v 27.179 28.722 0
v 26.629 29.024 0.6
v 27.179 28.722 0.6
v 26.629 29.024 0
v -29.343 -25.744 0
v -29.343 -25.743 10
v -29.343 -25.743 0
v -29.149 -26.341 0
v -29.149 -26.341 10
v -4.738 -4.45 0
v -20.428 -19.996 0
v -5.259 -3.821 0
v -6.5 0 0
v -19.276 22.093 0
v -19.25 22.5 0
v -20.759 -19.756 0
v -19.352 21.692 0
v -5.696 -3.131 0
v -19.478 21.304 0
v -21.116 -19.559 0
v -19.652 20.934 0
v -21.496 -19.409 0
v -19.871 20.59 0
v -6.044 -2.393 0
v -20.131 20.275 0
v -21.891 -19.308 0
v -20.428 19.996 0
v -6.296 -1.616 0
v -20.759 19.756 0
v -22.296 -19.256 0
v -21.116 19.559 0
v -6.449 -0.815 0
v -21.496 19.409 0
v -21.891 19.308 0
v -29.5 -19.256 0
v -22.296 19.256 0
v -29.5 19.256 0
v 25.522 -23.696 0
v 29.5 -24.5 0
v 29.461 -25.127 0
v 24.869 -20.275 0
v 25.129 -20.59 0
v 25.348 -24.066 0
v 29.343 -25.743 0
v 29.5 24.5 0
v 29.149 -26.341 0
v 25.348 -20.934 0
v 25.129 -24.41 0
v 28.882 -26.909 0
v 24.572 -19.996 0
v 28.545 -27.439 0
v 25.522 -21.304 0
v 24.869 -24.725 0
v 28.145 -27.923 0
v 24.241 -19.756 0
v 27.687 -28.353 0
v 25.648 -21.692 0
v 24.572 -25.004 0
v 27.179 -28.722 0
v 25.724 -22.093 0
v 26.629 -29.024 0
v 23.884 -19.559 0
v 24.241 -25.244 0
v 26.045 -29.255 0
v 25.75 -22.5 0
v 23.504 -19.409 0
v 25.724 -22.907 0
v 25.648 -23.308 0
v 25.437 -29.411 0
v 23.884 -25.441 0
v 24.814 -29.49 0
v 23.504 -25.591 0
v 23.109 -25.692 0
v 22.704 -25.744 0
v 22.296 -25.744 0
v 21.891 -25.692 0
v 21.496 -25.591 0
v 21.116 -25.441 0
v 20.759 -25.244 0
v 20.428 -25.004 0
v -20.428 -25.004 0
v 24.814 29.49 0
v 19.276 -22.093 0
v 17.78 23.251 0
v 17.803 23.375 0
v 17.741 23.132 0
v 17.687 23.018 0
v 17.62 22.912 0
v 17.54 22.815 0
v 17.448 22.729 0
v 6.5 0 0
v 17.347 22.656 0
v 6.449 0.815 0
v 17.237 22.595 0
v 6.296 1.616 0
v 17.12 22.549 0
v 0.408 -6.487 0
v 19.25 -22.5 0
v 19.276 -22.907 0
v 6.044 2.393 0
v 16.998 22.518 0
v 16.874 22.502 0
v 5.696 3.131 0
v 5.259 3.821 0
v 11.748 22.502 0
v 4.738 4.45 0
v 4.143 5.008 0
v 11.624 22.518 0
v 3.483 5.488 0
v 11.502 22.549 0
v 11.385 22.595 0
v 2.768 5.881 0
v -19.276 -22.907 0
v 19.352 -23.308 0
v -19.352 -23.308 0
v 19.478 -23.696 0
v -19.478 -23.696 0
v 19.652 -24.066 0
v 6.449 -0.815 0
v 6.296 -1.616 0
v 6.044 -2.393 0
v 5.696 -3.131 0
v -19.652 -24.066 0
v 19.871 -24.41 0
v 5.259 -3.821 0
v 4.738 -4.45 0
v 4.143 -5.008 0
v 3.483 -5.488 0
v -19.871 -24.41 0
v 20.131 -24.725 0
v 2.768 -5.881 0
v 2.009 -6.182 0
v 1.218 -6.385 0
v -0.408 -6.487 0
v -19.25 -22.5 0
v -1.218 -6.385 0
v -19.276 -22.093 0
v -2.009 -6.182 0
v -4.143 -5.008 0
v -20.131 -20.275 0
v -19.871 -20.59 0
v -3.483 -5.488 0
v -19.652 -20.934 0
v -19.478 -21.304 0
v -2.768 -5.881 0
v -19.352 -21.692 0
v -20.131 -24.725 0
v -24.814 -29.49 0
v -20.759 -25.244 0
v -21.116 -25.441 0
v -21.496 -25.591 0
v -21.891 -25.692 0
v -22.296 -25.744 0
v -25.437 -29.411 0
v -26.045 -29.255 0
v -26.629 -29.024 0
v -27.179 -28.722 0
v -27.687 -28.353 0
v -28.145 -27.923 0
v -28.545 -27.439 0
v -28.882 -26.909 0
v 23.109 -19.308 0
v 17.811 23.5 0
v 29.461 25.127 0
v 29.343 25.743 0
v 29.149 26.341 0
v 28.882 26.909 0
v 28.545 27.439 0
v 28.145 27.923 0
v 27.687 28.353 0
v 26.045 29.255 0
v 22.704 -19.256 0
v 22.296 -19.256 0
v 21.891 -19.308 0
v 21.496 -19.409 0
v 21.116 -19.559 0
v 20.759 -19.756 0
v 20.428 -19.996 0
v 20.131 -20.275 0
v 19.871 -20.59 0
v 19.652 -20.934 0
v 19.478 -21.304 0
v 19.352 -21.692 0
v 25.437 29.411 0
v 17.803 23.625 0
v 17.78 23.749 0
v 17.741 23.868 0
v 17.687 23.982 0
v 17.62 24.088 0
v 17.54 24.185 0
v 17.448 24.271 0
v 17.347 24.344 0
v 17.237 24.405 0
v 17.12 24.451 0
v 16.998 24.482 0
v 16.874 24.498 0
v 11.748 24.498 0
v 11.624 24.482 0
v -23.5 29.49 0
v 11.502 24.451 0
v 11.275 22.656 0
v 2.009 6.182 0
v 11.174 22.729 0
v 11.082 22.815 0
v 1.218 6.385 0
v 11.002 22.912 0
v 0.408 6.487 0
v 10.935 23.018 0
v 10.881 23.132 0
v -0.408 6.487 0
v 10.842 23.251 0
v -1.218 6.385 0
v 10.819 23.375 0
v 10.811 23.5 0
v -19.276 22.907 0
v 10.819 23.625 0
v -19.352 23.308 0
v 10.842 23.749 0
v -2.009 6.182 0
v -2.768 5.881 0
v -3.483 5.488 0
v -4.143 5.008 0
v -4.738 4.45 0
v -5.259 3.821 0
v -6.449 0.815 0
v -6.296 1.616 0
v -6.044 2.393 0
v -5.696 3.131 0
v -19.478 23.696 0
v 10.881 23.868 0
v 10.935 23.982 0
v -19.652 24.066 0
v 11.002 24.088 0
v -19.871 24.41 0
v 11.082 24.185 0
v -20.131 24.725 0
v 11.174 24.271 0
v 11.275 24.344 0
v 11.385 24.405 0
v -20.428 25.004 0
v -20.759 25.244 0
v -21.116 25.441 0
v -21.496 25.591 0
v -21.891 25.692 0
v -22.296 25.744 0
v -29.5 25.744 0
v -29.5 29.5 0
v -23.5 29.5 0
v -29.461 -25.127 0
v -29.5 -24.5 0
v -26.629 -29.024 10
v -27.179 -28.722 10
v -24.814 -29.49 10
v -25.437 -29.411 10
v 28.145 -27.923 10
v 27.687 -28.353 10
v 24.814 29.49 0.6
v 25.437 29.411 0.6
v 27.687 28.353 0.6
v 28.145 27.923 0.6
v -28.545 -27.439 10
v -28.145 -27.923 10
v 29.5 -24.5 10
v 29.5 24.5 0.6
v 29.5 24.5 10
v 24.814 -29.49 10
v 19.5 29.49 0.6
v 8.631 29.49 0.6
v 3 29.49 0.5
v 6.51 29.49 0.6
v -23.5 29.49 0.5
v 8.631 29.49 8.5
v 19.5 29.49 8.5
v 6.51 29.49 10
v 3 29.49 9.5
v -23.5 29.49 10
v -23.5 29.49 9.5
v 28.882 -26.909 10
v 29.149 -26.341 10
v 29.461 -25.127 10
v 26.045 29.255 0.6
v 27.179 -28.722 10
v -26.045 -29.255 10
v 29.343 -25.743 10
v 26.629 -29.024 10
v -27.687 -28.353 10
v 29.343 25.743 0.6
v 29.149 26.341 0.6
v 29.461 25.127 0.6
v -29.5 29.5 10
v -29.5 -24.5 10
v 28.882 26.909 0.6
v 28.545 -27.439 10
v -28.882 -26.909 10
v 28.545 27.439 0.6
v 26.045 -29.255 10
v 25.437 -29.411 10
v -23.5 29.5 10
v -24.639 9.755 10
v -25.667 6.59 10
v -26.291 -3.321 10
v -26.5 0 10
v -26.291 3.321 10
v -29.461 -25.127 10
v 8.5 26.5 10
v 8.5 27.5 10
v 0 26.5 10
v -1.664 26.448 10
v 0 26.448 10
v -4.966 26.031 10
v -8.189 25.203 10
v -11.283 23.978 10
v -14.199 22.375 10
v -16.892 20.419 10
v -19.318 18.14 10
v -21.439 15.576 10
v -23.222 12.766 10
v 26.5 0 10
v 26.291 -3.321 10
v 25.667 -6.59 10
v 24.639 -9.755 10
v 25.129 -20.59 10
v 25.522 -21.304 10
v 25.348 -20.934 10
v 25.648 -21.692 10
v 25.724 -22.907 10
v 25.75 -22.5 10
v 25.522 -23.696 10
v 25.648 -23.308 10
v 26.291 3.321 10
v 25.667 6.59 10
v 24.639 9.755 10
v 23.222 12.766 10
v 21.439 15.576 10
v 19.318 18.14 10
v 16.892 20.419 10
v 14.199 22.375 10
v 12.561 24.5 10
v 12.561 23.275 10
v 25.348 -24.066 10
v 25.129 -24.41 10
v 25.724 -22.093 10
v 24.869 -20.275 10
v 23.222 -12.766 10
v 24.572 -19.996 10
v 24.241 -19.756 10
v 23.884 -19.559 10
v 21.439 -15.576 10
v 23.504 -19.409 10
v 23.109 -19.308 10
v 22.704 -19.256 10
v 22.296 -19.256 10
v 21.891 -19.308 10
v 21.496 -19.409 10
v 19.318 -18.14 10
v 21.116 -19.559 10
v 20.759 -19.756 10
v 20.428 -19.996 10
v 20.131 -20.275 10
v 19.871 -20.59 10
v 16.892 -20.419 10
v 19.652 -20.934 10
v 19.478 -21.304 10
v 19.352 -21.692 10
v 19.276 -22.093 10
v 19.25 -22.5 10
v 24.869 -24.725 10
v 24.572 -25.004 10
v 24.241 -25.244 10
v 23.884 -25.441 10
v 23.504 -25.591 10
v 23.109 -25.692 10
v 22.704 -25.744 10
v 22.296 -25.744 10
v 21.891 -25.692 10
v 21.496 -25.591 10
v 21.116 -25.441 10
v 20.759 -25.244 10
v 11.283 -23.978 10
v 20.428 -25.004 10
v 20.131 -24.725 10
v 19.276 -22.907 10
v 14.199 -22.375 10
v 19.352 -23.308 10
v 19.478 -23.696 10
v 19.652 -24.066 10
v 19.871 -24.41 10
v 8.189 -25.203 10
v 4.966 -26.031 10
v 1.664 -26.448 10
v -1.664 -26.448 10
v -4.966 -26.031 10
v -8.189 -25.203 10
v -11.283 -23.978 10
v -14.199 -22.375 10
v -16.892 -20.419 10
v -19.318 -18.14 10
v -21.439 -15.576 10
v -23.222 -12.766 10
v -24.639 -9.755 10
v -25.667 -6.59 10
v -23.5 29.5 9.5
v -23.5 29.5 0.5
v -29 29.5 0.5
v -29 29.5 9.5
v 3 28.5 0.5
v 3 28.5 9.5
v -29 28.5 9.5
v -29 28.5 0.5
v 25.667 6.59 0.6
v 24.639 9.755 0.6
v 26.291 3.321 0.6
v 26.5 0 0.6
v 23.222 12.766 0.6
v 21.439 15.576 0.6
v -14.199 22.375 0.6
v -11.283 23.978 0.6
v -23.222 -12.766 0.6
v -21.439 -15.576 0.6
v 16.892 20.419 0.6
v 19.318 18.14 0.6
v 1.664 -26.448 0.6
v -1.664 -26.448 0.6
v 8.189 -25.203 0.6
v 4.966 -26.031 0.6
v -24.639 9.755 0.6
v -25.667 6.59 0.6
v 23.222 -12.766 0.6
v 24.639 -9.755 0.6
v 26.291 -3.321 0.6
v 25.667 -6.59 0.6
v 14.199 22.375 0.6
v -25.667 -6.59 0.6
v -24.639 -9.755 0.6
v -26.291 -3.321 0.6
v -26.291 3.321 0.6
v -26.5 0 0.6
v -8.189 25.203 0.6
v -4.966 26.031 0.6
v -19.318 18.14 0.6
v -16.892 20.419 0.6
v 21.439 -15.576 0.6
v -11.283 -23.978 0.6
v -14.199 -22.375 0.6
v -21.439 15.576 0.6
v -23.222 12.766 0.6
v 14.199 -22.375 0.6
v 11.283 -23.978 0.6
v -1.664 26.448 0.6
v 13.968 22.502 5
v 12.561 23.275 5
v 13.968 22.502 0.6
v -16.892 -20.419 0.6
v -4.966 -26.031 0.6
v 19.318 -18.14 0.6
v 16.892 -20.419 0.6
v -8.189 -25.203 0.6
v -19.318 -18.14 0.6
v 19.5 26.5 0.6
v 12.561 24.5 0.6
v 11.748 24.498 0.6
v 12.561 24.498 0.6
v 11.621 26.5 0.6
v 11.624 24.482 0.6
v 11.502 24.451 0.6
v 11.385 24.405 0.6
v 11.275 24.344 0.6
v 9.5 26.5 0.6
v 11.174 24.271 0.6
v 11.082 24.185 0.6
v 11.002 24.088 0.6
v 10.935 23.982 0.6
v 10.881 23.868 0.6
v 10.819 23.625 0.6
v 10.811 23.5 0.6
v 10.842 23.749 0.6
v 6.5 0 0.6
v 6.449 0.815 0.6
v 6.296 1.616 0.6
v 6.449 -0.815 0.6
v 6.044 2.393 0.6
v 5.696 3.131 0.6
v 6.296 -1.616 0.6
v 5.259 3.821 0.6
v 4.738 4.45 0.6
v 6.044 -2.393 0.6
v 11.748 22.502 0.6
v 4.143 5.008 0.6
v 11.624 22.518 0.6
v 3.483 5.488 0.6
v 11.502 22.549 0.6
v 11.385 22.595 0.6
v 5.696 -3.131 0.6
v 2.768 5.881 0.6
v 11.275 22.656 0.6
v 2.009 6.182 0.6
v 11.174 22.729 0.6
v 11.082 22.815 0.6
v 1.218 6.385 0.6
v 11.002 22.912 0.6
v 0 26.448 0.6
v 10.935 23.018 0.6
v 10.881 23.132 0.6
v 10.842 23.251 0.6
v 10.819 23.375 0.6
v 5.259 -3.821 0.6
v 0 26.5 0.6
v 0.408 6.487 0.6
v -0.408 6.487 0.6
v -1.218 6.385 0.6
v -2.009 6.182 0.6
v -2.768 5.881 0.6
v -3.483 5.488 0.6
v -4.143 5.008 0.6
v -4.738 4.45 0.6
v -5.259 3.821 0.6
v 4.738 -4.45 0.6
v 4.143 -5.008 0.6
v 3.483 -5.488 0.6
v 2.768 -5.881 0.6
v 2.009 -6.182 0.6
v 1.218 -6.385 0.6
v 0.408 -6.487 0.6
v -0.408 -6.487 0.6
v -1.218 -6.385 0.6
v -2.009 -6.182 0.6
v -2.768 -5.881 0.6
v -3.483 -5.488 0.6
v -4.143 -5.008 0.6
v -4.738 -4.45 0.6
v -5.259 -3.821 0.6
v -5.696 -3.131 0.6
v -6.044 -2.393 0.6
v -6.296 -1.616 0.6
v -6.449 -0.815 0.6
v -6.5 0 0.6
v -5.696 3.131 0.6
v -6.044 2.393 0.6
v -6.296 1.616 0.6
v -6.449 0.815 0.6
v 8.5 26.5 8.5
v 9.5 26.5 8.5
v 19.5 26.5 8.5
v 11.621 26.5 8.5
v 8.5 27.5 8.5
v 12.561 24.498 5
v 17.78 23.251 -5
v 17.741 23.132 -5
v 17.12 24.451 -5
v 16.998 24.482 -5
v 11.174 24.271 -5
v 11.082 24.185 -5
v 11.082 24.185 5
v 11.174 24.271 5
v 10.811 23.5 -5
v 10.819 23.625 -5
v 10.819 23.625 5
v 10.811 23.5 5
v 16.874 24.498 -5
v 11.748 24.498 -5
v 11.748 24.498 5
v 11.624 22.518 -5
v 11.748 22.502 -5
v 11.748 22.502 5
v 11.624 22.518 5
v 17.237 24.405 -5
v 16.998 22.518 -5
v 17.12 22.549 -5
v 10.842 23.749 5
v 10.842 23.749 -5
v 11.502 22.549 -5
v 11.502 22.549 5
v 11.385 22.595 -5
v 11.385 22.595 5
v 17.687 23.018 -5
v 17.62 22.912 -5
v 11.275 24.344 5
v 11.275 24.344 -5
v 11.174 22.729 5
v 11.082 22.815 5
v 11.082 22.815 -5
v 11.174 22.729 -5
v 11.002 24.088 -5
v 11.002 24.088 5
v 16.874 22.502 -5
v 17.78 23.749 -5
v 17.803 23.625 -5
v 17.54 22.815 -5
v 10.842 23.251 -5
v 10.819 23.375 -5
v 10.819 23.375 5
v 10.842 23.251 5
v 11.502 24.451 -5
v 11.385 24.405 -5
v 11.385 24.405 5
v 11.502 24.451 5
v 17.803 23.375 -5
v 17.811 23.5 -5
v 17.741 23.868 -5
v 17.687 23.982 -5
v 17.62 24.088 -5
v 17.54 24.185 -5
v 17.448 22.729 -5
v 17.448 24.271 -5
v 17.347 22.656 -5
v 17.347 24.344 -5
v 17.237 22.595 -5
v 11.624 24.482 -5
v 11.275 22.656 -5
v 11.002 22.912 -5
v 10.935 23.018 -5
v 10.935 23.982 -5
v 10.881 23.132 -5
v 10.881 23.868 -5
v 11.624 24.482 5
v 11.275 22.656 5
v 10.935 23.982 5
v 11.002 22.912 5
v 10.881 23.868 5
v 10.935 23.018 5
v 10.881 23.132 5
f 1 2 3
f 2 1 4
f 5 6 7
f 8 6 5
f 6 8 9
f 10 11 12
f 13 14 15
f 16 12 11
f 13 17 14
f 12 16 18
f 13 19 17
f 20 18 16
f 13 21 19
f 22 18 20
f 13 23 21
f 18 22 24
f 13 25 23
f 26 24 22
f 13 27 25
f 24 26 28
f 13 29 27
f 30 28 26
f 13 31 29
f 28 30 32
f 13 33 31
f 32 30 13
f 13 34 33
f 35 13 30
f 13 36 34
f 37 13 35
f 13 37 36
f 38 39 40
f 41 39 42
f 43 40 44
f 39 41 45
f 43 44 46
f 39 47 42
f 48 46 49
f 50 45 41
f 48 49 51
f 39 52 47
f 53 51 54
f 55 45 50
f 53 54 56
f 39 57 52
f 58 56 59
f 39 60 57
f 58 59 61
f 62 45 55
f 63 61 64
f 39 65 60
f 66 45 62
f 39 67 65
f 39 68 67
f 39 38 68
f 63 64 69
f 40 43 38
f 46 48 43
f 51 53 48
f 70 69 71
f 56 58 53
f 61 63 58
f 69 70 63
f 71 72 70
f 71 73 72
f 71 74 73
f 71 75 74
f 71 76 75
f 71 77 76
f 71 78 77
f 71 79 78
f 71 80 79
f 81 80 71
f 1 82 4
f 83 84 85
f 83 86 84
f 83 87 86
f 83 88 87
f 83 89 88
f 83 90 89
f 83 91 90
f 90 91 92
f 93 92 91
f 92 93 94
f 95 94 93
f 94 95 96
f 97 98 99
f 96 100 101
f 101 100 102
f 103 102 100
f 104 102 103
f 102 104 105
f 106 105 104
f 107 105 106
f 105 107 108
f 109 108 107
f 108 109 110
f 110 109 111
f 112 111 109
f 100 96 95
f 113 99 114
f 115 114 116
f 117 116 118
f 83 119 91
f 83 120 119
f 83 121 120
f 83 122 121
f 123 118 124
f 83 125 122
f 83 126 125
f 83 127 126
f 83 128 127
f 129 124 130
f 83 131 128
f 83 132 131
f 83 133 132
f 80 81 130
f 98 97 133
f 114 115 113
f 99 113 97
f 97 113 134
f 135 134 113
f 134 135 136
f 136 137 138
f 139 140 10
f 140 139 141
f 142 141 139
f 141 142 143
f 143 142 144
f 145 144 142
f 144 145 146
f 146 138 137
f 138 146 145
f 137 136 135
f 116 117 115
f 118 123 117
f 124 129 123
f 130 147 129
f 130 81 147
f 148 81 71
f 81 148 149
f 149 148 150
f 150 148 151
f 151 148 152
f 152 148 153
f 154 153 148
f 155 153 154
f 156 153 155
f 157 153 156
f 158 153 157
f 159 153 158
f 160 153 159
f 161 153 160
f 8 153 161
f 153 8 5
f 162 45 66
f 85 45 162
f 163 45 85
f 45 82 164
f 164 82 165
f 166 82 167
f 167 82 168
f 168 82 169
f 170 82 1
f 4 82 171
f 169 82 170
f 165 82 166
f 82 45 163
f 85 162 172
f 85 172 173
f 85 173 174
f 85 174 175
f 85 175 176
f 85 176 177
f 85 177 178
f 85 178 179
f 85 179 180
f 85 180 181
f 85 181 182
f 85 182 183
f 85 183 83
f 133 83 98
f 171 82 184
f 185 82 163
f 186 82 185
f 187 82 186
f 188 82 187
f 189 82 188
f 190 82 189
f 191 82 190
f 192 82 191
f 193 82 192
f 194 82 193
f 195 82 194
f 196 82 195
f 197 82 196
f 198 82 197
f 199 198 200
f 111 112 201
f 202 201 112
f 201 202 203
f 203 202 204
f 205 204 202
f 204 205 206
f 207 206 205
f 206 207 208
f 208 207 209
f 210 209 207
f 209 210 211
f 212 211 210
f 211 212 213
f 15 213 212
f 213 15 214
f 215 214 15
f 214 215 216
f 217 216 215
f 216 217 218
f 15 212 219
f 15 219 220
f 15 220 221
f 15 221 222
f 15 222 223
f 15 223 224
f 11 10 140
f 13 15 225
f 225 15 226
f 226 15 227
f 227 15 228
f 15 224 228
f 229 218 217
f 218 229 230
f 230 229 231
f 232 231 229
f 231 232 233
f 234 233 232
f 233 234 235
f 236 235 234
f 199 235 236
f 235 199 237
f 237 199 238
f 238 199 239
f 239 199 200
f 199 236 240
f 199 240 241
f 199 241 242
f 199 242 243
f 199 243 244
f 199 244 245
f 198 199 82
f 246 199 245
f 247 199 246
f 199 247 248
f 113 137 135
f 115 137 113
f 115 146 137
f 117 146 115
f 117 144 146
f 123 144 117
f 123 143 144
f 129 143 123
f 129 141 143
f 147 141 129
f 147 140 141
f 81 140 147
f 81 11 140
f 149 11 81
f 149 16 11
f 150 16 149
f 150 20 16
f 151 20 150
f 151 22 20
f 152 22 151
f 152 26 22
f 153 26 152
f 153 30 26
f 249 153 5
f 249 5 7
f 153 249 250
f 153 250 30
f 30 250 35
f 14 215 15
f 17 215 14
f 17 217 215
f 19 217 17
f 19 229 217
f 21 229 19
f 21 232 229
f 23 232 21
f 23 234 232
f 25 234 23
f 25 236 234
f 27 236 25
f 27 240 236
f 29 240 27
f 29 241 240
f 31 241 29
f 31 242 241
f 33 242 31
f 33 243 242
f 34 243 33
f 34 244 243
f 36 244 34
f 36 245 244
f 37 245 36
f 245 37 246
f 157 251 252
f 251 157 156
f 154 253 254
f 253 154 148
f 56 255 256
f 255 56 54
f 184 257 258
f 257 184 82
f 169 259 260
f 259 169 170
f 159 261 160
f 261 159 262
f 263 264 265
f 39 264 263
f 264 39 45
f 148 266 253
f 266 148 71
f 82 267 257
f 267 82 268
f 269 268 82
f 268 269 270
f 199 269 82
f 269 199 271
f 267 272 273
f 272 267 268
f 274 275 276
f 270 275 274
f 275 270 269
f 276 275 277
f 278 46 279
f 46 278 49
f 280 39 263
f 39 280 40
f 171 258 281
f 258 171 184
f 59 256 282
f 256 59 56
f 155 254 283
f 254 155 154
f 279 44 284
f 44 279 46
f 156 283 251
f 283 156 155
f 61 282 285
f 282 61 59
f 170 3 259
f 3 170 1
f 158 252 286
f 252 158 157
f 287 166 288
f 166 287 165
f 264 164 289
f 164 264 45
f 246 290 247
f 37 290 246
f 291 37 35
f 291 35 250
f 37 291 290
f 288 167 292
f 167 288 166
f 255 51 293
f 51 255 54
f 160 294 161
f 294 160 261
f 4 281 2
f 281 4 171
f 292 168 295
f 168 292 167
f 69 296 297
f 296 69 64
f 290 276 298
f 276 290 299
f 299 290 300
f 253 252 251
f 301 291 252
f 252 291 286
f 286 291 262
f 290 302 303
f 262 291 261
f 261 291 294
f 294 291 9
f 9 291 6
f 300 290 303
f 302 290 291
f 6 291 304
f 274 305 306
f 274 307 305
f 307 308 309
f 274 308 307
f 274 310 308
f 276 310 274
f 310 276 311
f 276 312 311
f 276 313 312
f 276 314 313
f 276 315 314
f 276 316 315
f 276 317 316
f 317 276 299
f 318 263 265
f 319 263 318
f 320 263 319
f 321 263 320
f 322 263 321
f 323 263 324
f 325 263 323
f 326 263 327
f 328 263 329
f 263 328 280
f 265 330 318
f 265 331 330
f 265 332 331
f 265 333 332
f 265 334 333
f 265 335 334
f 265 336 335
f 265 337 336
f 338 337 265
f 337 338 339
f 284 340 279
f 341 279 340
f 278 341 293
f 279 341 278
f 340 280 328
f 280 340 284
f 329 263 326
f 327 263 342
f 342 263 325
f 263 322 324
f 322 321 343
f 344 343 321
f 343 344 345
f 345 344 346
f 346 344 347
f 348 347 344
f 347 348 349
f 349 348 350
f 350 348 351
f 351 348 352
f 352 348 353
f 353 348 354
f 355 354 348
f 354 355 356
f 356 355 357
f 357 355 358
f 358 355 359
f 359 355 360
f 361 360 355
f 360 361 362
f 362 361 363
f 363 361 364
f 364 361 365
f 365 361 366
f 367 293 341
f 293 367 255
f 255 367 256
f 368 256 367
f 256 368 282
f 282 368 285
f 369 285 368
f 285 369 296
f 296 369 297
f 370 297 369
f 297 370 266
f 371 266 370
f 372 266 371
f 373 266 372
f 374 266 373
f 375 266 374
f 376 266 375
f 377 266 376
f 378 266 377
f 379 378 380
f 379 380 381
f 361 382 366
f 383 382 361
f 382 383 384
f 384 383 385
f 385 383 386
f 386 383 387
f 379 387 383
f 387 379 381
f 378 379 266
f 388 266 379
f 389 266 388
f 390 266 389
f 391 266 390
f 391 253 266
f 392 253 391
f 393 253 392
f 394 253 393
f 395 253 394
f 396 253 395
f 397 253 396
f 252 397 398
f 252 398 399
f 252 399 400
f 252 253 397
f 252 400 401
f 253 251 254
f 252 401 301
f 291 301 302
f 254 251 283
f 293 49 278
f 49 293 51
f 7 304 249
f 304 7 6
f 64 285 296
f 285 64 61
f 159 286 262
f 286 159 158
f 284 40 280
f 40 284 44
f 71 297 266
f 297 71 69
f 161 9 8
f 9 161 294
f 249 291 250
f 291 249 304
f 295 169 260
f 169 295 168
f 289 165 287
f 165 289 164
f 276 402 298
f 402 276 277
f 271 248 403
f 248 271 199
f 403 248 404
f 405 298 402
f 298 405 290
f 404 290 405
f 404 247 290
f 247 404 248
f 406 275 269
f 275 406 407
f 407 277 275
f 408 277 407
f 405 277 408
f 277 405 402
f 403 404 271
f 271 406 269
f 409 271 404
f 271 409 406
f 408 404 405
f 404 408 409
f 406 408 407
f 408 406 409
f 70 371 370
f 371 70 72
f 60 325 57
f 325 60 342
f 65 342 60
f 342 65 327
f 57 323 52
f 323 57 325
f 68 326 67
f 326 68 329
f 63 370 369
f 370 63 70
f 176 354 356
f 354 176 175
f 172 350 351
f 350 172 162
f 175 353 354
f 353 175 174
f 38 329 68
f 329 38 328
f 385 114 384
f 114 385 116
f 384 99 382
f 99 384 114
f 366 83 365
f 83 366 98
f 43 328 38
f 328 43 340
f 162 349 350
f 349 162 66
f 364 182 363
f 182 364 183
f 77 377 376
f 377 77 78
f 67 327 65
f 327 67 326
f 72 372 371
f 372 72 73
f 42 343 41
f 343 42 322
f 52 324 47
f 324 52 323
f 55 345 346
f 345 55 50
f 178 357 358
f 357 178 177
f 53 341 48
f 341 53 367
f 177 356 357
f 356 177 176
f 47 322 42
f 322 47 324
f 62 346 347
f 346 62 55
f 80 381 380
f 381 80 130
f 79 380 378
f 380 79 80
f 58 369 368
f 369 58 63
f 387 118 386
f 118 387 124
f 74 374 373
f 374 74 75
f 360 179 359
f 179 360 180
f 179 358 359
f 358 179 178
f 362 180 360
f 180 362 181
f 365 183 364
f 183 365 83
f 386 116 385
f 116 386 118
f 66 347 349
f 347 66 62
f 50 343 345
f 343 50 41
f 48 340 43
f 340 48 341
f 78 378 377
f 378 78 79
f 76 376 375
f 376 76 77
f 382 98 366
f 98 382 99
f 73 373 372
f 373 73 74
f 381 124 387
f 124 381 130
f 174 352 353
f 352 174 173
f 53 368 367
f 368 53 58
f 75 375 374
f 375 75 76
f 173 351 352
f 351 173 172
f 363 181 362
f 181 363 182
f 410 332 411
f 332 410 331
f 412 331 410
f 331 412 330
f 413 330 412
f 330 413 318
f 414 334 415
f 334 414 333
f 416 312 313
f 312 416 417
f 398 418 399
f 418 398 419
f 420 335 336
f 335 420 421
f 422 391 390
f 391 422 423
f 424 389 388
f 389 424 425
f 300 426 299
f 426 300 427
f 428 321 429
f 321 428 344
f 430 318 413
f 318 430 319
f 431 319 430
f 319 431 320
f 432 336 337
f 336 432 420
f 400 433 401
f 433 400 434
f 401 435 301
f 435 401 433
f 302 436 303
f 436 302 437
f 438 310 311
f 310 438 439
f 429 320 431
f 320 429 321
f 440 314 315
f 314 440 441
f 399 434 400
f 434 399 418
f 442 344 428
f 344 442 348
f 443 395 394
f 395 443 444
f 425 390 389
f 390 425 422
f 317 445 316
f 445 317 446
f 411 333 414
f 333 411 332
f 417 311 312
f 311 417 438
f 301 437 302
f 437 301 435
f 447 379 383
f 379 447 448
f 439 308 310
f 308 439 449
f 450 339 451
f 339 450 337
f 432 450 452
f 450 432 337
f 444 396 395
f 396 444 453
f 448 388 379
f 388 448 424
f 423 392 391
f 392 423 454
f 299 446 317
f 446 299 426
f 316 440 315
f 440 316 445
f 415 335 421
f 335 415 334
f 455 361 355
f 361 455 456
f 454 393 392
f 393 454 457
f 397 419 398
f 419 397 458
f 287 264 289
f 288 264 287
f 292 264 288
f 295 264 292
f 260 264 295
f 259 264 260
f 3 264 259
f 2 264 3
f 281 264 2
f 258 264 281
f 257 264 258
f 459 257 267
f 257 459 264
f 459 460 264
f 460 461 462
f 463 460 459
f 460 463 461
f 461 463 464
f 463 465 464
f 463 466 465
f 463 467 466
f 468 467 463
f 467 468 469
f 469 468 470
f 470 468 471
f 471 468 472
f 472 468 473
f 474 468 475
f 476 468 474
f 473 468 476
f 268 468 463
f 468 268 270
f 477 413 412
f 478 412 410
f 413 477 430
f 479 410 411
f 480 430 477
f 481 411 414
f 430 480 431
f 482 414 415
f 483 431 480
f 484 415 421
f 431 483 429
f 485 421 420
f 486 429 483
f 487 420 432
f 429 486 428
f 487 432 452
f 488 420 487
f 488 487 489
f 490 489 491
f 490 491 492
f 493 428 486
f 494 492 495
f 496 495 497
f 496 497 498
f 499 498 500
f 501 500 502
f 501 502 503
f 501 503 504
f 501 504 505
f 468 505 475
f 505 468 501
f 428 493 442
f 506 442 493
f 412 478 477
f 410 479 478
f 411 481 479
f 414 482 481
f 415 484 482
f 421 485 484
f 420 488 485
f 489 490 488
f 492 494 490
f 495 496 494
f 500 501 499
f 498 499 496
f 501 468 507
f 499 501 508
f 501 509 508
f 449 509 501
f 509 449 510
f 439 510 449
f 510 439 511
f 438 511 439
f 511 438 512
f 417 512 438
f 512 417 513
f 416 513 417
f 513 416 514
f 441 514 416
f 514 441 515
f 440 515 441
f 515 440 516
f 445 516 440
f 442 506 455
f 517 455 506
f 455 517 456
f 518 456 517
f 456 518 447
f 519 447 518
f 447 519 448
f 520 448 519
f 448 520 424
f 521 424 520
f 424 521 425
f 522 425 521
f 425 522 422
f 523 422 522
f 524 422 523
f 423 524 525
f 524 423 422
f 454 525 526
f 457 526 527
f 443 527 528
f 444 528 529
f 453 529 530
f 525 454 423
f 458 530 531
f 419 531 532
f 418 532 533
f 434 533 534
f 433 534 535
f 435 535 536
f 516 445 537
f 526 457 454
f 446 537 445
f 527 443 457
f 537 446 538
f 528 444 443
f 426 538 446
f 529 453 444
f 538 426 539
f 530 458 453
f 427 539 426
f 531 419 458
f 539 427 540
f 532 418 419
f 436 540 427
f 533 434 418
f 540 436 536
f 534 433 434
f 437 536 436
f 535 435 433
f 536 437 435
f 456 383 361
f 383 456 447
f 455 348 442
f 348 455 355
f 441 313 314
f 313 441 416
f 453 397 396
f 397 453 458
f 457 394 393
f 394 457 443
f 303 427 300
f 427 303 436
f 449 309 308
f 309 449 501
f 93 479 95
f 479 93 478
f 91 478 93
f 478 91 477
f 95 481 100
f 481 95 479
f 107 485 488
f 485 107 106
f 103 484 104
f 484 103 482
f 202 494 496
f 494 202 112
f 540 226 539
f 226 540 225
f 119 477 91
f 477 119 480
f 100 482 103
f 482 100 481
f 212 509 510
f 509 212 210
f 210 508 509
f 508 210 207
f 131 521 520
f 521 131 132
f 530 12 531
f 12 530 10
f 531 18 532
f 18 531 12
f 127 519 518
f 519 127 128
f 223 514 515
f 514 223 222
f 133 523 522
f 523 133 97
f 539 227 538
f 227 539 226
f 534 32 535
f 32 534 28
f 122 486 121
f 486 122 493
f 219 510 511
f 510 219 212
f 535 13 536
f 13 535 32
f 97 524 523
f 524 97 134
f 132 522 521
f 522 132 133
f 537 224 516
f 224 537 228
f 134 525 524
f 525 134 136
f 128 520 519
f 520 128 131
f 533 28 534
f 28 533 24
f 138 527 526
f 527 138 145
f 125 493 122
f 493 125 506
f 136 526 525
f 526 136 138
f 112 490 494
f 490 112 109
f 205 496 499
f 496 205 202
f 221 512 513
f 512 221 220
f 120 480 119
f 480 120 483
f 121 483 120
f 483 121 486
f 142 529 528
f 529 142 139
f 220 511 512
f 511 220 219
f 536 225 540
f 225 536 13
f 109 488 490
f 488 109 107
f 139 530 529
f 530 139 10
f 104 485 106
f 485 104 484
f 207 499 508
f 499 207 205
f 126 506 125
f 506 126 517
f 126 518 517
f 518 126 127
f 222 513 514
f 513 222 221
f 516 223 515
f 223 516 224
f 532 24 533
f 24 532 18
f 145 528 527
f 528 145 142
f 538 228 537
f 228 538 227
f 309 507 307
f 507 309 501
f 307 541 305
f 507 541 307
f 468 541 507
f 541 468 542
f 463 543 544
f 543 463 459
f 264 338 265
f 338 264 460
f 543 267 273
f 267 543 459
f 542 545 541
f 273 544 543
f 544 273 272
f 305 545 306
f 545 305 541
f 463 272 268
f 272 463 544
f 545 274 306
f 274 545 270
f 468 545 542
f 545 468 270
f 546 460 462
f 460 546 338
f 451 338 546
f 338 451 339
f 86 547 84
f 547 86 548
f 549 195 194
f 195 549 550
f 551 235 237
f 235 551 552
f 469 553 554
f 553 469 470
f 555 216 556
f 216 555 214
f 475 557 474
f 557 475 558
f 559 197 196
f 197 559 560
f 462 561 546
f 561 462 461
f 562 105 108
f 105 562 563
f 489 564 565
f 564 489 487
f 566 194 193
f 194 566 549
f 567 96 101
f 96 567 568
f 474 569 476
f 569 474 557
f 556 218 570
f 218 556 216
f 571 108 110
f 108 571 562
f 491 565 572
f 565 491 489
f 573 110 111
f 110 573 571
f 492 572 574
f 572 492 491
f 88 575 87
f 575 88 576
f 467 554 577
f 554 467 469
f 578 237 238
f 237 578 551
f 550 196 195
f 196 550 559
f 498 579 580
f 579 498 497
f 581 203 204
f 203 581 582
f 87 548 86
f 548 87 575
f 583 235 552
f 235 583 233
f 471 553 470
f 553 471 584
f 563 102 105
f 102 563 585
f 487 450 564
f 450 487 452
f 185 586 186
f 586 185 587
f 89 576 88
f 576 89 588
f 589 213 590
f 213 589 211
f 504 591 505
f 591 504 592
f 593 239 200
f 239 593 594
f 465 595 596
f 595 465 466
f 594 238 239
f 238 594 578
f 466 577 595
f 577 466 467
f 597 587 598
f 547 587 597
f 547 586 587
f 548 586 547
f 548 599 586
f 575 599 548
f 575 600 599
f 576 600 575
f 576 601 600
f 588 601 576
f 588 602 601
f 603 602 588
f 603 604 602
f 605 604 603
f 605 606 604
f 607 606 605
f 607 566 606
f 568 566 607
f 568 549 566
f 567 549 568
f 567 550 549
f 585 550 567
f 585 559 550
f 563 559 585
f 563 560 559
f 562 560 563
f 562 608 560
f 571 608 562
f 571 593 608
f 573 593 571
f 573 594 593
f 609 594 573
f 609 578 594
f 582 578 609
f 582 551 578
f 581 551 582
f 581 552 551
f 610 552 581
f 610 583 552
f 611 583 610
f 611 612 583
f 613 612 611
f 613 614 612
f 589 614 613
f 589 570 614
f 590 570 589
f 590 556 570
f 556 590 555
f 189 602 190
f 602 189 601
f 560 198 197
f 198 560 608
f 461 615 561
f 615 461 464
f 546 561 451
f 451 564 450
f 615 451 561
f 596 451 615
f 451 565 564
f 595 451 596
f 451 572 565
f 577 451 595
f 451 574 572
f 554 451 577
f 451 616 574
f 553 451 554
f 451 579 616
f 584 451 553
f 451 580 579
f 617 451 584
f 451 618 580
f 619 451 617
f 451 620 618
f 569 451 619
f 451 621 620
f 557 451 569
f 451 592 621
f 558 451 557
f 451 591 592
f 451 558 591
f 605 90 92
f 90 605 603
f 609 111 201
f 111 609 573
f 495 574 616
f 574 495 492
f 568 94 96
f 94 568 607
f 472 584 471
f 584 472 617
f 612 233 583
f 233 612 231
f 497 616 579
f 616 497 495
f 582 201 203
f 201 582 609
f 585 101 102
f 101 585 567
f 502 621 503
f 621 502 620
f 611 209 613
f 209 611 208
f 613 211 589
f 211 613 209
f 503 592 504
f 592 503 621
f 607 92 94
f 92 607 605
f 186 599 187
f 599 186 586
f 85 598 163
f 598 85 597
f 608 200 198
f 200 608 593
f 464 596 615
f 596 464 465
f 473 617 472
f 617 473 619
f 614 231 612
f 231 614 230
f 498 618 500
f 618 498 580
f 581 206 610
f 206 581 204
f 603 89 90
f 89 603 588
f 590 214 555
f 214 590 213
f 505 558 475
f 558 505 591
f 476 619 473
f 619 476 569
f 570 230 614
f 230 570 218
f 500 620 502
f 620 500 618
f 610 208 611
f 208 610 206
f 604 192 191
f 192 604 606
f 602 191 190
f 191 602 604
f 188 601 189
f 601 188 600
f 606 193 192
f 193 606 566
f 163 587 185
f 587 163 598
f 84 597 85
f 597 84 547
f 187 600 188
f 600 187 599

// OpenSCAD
$fn = 50;


union() {
	difference() {
		union() {
			hull() {
				translate(v = [-24.5000000000, 24.5000000000, 0]) {
					cylinder(h = 10, r = 5);
				}
				translate(v = [24.5000000000, 24.5000000000, 0]) {
					cylinder(h = 10, r = 5);
				}
				translate(v = [-24.5000000000, -24.5000000000, 0]) {
					cylinder(h = 10, r = 5);
				}
				translate(v = [24.5000000000, -24.5000000000, 0]) {
					cylinder(h = 10, r = 5);
				}
			}
			translate(v = [-29.5000000000, 23.5000000000, 0]) {
				cube(size = [6, 6, 10]);
			}
		}
		union() {
			translate(v = [-30.0000000000, -22.5000000000, -250.0000000000]) {
				rotate(a = [0, 0, 0]) {
					difference() {
						union() {
							hull() {
								translate(v = [7.5000000000, 0, 0]) {
									cylinder(h = 250, r = 3.2500000000, r1 = 3.2500000000, r2 = 3.2500000000);
								}
								translate(v = [-7.5000000000, 0, 0]) {
									cylinder(h = 250, r = 3.2500000000, r1 = 3.2500000000, r2 = 3.2500000000);
								}
							}
						}
						union();
					}
				}
			}
			translate(v = [-30.0000000000, 22.5000000000, -250.0000000000]) {
				rotate(a = [0, 0, 0]) {
					difference() {
						union() {
							hull() {
								translate(v = [7.5000000000, 0, 0]) {
									cylinder(h = 250, r = 3.2500000000, r1 = 3.2500000000, r2 = 3.2500000000);
								}
								translate(v = [-7.5000000000, 0, 0]) {
									cylinder(h = 250, r = 3.2500000000, r1 = 3.2500000000, r2 = 3.2500000000);
								}
							}
						}
						union();
					}
				}
			}
			translate(v = [-29.0000000000, 28.5000000000, 0.5000000000]) {
				cube(size = [32, 1, 9.0000000000]);
			}
			translate(v = [22.5000000000, -22.5000000000, 0]) {
				cylinder(h = 100, r = 3.2500000000);
			}
			translate(v = [0, 0, 0.6000000000]) {
				cylinder(h = 12.4000000000, r = 26.5000000000);
			}
			translate(v = [0, 0, -5.0000000000]) {
				cylinder(h = 10, r = 6.5000000000);
			}
			translate(v = [0.0000000000, 24.5000000000, 0.6000000000]) {
				cube(size = [29.5000000000, 2, 12.4000000000]);
			}
			translate(v = [19.5000000000, 24.5000000000, 0.6000000000]) {
				cube(size = [10, 5, 12.4000000000]);
			}
			translate(v = [8.5000000000, 24.5000000000, 8.5000000000]) {
				cube(size = [21, 5, 1.5000000000]);
			}
			translate(v = [5.7500000000, 30.2500000000, 0.6000000000]) {
				rotate(a = [0, 0, -45]) {
					cube(size = [7.5000000000, 1.5000000000, 12.4000000000]);
				}
			}
			translate(v = [5.0610000000, 22.5000000000, 0.6000000000]) {
				cube(size = [7.5000000000, 2, 9.4000000000]);
			}
		}
	}
	union() {
		translate(v = [14.3110000000, 23.5000000000, -5.0000000000]) {
			rotate(a = [0, 0, 0]) {
				difference() {
					union() {
						#hull() {
							#translate(v = [2.5000000000, 0, 0]) {
								cylinder(h = 10, r = 1.0000000000, r1 = 1.0000000000, r2 = 1.0000000000);
							}
							#translate(v = [-2.5000000000, 0, 0]) {
								cylinder(h = 10, r = 1.0000000000, r1 = 1.0000000000, r2 = 1.0000000000);
							}
						}
					}
					union();
				}
			}
		}
	}
}
